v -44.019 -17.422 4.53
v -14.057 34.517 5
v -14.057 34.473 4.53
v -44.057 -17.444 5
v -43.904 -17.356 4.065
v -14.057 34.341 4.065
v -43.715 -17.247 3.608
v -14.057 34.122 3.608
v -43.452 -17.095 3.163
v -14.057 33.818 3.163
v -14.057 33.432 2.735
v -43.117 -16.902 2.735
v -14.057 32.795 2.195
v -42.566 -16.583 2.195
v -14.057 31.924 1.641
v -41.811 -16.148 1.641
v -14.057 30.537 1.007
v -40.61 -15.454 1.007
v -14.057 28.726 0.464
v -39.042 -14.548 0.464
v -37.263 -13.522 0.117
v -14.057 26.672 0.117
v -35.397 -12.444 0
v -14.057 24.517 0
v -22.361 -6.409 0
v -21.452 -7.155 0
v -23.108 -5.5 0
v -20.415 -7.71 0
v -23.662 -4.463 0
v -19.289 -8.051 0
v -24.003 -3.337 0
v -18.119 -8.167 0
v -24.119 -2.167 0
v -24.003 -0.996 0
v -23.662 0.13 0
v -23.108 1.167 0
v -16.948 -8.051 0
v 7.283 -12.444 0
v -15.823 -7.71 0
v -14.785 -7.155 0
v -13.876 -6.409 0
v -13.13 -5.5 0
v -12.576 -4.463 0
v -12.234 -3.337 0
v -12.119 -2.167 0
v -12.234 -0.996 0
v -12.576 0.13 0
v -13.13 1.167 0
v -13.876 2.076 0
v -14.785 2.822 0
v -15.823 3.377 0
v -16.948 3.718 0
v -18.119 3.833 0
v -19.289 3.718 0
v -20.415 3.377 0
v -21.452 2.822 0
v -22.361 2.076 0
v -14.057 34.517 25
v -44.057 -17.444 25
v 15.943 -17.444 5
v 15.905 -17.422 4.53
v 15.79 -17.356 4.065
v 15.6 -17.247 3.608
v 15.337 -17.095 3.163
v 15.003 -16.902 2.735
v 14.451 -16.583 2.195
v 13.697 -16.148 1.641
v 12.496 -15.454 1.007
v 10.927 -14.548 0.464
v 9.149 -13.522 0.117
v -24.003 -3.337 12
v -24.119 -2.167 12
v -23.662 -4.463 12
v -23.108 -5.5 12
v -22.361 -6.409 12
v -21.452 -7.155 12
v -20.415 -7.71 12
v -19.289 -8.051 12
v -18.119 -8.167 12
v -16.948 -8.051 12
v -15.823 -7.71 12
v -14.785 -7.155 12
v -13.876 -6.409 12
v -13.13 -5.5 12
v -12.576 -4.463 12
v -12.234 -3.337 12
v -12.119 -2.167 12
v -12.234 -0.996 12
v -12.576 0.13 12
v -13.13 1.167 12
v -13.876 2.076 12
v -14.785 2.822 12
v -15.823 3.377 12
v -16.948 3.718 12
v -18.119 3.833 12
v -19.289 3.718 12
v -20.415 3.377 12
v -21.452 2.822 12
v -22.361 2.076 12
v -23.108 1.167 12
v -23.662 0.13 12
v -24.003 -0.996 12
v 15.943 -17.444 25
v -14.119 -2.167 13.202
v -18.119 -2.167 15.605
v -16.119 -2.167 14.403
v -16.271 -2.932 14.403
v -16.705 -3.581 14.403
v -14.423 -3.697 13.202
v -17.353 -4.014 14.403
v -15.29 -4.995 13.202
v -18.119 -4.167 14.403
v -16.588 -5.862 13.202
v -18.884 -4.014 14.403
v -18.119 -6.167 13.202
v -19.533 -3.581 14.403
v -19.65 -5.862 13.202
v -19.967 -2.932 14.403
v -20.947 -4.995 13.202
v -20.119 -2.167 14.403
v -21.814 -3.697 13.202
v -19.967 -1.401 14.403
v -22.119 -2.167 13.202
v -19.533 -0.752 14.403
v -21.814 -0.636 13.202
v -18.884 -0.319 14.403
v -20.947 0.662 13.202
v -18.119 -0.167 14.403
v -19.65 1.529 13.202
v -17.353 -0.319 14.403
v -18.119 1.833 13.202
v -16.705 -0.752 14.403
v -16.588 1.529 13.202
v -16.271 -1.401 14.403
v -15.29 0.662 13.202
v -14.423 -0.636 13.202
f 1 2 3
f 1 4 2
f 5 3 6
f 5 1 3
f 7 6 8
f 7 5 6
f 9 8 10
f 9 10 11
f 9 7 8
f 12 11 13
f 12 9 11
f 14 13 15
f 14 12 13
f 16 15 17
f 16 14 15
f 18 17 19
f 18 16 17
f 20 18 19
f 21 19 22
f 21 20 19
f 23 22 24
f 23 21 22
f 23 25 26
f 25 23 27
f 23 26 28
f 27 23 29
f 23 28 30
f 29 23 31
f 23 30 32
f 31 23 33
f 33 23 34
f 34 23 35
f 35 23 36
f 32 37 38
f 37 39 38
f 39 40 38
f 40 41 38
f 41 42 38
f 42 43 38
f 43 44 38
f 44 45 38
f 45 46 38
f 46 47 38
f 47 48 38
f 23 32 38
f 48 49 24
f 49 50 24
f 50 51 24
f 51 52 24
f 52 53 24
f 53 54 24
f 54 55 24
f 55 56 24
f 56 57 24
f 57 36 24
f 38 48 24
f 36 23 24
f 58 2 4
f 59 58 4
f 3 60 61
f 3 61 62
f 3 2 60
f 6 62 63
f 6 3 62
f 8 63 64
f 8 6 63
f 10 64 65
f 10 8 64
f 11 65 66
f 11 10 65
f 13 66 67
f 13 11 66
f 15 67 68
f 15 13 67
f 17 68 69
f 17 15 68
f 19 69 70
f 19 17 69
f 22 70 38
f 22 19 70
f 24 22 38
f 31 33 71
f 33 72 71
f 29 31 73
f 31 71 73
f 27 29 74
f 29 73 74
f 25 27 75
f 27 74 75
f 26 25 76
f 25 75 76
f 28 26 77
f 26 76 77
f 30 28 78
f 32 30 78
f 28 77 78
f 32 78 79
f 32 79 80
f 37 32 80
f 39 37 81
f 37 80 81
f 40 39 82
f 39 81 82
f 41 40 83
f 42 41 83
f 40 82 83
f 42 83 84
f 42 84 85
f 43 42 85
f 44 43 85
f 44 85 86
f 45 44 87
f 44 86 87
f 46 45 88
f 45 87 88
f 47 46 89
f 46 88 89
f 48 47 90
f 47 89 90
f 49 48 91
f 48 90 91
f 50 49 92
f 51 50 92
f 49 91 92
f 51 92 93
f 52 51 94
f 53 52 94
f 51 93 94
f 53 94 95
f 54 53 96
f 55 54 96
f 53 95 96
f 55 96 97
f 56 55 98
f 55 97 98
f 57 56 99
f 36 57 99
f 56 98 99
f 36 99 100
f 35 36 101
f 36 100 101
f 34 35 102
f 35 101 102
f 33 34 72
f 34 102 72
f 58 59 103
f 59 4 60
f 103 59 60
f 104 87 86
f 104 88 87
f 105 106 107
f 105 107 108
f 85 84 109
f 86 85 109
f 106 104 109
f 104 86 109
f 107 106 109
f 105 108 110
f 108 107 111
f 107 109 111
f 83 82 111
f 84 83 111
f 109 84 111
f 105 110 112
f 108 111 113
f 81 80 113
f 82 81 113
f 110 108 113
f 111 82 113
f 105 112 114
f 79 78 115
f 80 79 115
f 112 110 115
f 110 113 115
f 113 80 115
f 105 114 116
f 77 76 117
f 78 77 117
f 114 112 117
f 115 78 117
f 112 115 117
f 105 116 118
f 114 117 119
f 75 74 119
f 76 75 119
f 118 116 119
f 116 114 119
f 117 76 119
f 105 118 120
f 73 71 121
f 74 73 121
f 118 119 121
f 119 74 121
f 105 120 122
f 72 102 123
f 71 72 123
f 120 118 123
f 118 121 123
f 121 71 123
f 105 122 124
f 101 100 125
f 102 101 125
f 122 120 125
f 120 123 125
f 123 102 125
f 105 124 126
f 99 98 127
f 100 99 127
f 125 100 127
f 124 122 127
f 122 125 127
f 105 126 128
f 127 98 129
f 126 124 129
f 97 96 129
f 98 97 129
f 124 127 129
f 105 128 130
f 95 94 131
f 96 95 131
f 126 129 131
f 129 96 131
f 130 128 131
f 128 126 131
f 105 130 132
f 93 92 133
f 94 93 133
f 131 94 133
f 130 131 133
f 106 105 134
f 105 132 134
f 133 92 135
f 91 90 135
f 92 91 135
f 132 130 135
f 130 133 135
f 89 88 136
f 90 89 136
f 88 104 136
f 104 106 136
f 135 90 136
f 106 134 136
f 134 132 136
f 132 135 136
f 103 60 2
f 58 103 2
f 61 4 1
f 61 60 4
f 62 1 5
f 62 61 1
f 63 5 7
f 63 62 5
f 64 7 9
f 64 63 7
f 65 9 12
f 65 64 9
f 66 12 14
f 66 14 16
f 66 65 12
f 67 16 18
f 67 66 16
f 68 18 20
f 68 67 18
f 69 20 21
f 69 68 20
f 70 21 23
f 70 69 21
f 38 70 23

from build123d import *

# Parameters (mm, degrees)
F0_R     = 7.3867254589
F1_DEPTH = 25
F3_D     = 12
F3_DEPTH = 12
F3_TIP   = 3.6051637142
F4_R     = 5


with BuildPart() as f1:
    # F0 (on Top) → F1 (new body)
    with BuildSketch(Plane.XY):
        Polygon((15.9428178774, -17.4442061965), (-14.0571821226, 34.5173180305), (-44.0571821226, -17.4442061965), align=None)
        with Locations((-21.5571821226, -4.4538251398)):
            Circle(F0_R, mode=Mode.SUBTRACT)
        with Locations((-21.5571821226, -4.4538251398)):
            Circle(F0_R)
    extrude(amount=F1_DEPTH)

    # F3
    with Locations(Plane(origin=(0, 0, 0), x_dir=(1, 0, 0), z_dir=(0, 0, -1))):
        with Locations((-18.1187801063, 2.1665317472)):
            Hole(F3_D / 2, depth=F3_DEPTH)
            with Locations((0, 0, -(F3_DEPTH + F3_TIP / 2))):  # 118° drill point
                Cone(0, F3_D / 2, F3_TIP, mode=Mode.SUBTRACT)

    # F4
    f4_edges = [f1.edges().sort_by_distance(p)[0] for p in [
        (0.942818, 8.536556, 0),
        (-14.057182, -17.444206, 0),
        (-29.057182, 8.536556, 0),
    ]]
    fillet(f4_edges, radius=F4_R)


solid = f1.part
